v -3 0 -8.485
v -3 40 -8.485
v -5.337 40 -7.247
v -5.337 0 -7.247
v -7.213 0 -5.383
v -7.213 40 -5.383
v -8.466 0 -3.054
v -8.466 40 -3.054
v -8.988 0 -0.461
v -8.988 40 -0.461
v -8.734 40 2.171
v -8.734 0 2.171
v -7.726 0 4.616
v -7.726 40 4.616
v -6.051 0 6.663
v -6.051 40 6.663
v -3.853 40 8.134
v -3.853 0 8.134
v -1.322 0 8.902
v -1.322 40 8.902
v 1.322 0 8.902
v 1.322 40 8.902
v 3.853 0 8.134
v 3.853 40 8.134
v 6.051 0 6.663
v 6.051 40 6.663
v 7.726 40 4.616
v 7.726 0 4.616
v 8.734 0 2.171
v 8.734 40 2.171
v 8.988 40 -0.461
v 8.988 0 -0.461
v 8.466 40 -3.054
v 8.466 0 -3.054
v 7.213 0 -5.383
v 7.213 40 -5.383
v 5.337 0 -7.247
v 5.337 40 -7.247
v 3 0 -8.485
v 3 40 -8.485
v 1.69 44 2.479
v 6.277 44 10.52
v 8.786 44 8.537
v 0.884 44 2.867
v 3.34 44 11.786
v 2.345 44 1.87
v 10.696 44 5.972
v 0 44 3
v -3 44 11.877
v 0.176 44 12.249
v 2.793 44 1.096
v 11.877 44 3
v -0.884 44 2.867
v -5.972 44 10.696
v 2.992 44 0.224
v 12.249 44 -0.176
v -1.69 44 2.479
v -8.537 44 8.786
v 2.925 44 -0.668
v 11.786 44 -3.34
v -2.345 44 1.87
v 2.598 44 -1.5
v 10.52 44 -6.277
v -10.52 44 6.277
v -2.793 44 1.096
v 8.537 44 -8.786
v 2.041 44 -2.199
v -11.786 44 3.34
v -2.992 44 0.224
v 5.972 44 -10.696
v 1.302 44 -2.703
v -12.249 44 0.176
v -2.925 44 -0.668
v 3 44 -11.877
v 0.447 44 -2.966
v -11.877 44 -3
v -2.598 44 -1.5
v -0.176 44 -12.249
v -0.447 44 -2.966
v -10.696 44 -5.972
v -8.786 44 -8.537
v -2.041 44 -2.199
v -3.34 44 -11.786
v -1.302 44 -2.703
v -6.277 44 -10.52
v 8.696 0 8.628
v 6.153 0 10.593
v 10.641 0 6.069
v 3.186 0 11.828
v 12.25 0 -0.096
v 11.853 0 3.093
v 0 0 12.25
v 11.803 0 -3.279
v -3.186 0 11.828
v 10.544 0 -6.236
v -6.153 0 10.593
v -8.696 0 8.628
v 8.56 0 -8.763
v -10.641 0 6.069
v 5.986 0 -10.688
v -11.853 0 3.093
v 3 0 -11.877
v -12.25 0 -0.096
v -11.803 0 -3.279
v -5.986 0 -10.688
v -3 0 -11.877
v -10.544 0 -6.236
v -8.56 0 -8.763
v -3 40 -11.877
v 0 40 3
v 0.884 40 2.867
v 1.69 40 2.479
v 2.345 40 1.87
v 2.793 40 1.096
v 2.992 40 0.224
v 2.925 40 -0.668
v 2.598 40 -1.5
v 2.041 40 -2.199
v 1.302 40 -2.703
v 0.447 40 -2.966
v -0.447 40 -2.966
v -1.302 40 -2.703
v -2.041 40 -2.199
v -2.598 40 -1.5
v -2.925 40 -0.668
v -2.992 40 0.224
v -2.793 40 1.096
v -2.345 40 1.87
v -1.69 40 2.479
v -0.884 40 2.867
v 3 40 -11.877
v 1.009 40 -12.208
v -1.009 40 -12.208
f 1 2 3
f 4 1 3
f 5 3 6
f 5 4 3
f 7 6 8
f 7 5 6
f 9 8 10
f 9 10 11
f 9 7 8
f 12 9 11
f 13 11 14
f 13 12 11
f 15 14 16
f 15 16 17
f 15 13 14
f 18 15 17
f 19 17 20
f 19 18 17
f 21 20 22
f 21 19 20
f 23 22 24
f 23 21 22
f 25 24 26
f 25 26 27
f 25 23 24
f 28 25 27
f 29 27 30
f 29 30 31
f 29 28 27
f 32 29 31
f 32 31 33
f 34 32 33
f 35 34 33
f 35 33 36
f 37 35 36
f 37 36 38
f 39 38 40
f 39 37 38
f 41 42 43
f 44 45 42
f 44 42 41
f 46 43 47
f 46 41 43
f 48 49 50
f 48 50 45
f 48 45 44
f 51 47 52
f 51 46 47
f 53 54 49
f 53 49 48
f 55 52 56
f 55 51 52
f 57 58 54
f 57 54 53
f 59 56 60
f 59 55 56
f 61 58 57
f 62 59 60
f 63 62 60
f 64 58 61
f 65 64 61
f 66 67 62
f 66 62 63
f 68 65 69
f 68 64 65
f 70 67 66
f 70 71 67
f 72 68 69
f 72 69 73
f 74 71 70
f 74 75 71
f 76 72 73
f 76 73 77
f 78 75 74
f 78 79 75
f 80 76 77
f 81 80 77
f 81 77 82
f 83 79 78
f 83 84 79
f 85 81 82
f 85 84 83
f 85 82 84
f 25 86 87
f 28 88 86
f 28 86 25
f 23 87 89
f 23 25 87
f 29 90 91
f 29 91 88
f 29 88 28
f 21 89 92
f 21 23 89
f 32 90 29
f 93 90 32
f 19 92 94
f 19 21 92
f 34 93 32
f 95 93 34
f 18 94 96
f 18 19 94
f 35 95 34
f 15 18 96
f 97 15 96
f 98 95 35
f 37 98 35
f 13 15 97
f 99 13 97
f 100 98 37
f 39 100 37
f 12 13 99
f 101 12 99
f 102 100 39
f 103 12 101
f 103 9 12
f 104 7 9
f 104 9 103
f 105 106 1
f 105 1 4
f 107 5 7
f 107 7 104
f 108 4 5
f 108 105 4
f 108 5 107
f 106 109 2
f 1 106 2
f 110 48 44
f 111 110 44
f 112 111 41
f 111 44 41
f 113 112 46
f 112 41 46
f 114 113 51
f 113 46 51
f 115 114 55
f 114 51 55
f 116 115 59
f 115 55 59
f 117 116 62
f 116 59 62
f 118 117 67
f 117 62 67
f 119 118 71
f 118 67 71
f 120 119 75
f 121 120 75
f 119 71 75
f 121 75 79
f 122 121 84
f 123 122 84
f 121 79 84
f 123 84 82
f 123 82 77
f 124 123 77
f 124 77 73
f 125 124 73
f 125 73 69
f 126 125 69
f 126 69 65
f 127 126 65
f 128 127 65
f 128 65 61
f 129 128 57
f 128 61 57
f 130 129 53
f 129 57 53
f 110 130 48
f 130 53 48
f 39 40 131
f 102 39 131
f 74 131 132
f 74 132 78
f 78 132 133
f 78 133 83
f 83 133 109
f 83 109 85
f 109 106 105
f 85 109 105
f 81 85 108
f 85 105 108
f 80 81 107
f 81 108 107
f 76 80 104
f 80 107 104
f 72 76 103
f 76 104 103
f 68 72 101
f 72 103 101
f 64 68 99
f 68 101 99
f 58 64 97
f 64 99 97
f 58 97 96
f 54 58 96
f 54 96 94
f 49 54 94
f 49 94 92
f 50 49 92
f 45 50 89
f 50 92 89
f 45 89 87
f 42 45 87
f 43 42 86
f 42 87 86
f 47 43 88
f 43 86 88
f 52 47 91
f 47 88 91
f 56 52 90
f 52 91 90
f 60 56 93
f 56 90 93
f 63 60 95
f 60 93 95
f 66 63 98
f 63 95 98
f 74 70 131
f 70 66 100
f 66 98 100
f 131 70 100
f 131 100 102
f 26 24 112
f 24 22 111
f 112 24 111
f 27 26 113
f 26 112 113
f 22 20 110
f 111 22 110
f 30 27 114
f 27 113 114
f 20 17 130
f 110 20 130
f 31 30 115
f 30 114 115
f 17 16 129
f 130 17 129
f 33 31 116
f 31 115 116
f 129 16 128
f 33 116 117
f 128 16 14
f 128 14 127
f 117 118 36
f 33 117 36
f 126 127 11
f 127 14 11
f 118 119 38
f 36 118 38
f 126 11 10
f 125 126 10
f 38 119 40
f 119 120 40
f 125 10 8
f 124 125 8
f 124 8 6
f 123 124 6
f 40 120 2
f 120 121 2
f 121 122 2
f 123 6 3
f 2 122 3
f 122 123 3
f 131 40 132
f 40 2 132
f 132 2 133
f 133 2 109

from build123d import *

# Parameters (mm, degrees)
SALIENTE_EXTRUIR1_DEPTH = 40
CROQUIS2_R              = 12.25
SALIENTE_EXTRUIR2_DEPTH = 4
CROQUIS3_R              = 3
CORTAR_EXTRUIR1_DEPTH   = 4


with BuildPart() as part:
    # Croquis1 → Saliente-Extruir1 (new body)
    with BuildSketch(Plane(origin=(0, 0, 0), x_dir=(1, 0, 0), z_dir=(0, 1, 0))):
        with BuildLine():
            Line((-3, 11.87697352), (-3, 8.485281374))
            ThreePointArc((-3, 8.485281374), (0, -9), (3, 8.485281374))
            Line((3, 8.485281374), (3, 11.87697352))
            ThreePointArc((3, 11.87697352), (0, -12.25), (-3, 11.87697352))
        make_face()
    extrude(amount=SALIENTE_EXTRUIR1_DEPTH)

    # Croquis2 → Saliente-Extruir2 (add)
    with BuildSketch(Plane(origin=(0, 40, 0), x_dir=(1, 0, 0), z_dir=(0, 1, 0))):
        with Locations(Location((0, 0, 0), (0, 0, 75.824196484))):
            Circle(CROQUIS2_R)
    extrude(amount=SALIENTE_EXTRUIR2_DEPTH)

    # Croquis3 → Cortar-Extruir1 (cut)
    with BuildSketch(Plane(origin=(0, 44, 0), x_dir=(1, 0, 0), z_dir=(0, 1, 0))):
        with Locations(Location((0, 0, 0), (0, 0, 270))):
            Circle(CROQUIS3_R)
    extrude(amount=-CORTAR_EXTRUIR1_DEPTH, mode=Mode.SUBTRACT)


solid = part.part
